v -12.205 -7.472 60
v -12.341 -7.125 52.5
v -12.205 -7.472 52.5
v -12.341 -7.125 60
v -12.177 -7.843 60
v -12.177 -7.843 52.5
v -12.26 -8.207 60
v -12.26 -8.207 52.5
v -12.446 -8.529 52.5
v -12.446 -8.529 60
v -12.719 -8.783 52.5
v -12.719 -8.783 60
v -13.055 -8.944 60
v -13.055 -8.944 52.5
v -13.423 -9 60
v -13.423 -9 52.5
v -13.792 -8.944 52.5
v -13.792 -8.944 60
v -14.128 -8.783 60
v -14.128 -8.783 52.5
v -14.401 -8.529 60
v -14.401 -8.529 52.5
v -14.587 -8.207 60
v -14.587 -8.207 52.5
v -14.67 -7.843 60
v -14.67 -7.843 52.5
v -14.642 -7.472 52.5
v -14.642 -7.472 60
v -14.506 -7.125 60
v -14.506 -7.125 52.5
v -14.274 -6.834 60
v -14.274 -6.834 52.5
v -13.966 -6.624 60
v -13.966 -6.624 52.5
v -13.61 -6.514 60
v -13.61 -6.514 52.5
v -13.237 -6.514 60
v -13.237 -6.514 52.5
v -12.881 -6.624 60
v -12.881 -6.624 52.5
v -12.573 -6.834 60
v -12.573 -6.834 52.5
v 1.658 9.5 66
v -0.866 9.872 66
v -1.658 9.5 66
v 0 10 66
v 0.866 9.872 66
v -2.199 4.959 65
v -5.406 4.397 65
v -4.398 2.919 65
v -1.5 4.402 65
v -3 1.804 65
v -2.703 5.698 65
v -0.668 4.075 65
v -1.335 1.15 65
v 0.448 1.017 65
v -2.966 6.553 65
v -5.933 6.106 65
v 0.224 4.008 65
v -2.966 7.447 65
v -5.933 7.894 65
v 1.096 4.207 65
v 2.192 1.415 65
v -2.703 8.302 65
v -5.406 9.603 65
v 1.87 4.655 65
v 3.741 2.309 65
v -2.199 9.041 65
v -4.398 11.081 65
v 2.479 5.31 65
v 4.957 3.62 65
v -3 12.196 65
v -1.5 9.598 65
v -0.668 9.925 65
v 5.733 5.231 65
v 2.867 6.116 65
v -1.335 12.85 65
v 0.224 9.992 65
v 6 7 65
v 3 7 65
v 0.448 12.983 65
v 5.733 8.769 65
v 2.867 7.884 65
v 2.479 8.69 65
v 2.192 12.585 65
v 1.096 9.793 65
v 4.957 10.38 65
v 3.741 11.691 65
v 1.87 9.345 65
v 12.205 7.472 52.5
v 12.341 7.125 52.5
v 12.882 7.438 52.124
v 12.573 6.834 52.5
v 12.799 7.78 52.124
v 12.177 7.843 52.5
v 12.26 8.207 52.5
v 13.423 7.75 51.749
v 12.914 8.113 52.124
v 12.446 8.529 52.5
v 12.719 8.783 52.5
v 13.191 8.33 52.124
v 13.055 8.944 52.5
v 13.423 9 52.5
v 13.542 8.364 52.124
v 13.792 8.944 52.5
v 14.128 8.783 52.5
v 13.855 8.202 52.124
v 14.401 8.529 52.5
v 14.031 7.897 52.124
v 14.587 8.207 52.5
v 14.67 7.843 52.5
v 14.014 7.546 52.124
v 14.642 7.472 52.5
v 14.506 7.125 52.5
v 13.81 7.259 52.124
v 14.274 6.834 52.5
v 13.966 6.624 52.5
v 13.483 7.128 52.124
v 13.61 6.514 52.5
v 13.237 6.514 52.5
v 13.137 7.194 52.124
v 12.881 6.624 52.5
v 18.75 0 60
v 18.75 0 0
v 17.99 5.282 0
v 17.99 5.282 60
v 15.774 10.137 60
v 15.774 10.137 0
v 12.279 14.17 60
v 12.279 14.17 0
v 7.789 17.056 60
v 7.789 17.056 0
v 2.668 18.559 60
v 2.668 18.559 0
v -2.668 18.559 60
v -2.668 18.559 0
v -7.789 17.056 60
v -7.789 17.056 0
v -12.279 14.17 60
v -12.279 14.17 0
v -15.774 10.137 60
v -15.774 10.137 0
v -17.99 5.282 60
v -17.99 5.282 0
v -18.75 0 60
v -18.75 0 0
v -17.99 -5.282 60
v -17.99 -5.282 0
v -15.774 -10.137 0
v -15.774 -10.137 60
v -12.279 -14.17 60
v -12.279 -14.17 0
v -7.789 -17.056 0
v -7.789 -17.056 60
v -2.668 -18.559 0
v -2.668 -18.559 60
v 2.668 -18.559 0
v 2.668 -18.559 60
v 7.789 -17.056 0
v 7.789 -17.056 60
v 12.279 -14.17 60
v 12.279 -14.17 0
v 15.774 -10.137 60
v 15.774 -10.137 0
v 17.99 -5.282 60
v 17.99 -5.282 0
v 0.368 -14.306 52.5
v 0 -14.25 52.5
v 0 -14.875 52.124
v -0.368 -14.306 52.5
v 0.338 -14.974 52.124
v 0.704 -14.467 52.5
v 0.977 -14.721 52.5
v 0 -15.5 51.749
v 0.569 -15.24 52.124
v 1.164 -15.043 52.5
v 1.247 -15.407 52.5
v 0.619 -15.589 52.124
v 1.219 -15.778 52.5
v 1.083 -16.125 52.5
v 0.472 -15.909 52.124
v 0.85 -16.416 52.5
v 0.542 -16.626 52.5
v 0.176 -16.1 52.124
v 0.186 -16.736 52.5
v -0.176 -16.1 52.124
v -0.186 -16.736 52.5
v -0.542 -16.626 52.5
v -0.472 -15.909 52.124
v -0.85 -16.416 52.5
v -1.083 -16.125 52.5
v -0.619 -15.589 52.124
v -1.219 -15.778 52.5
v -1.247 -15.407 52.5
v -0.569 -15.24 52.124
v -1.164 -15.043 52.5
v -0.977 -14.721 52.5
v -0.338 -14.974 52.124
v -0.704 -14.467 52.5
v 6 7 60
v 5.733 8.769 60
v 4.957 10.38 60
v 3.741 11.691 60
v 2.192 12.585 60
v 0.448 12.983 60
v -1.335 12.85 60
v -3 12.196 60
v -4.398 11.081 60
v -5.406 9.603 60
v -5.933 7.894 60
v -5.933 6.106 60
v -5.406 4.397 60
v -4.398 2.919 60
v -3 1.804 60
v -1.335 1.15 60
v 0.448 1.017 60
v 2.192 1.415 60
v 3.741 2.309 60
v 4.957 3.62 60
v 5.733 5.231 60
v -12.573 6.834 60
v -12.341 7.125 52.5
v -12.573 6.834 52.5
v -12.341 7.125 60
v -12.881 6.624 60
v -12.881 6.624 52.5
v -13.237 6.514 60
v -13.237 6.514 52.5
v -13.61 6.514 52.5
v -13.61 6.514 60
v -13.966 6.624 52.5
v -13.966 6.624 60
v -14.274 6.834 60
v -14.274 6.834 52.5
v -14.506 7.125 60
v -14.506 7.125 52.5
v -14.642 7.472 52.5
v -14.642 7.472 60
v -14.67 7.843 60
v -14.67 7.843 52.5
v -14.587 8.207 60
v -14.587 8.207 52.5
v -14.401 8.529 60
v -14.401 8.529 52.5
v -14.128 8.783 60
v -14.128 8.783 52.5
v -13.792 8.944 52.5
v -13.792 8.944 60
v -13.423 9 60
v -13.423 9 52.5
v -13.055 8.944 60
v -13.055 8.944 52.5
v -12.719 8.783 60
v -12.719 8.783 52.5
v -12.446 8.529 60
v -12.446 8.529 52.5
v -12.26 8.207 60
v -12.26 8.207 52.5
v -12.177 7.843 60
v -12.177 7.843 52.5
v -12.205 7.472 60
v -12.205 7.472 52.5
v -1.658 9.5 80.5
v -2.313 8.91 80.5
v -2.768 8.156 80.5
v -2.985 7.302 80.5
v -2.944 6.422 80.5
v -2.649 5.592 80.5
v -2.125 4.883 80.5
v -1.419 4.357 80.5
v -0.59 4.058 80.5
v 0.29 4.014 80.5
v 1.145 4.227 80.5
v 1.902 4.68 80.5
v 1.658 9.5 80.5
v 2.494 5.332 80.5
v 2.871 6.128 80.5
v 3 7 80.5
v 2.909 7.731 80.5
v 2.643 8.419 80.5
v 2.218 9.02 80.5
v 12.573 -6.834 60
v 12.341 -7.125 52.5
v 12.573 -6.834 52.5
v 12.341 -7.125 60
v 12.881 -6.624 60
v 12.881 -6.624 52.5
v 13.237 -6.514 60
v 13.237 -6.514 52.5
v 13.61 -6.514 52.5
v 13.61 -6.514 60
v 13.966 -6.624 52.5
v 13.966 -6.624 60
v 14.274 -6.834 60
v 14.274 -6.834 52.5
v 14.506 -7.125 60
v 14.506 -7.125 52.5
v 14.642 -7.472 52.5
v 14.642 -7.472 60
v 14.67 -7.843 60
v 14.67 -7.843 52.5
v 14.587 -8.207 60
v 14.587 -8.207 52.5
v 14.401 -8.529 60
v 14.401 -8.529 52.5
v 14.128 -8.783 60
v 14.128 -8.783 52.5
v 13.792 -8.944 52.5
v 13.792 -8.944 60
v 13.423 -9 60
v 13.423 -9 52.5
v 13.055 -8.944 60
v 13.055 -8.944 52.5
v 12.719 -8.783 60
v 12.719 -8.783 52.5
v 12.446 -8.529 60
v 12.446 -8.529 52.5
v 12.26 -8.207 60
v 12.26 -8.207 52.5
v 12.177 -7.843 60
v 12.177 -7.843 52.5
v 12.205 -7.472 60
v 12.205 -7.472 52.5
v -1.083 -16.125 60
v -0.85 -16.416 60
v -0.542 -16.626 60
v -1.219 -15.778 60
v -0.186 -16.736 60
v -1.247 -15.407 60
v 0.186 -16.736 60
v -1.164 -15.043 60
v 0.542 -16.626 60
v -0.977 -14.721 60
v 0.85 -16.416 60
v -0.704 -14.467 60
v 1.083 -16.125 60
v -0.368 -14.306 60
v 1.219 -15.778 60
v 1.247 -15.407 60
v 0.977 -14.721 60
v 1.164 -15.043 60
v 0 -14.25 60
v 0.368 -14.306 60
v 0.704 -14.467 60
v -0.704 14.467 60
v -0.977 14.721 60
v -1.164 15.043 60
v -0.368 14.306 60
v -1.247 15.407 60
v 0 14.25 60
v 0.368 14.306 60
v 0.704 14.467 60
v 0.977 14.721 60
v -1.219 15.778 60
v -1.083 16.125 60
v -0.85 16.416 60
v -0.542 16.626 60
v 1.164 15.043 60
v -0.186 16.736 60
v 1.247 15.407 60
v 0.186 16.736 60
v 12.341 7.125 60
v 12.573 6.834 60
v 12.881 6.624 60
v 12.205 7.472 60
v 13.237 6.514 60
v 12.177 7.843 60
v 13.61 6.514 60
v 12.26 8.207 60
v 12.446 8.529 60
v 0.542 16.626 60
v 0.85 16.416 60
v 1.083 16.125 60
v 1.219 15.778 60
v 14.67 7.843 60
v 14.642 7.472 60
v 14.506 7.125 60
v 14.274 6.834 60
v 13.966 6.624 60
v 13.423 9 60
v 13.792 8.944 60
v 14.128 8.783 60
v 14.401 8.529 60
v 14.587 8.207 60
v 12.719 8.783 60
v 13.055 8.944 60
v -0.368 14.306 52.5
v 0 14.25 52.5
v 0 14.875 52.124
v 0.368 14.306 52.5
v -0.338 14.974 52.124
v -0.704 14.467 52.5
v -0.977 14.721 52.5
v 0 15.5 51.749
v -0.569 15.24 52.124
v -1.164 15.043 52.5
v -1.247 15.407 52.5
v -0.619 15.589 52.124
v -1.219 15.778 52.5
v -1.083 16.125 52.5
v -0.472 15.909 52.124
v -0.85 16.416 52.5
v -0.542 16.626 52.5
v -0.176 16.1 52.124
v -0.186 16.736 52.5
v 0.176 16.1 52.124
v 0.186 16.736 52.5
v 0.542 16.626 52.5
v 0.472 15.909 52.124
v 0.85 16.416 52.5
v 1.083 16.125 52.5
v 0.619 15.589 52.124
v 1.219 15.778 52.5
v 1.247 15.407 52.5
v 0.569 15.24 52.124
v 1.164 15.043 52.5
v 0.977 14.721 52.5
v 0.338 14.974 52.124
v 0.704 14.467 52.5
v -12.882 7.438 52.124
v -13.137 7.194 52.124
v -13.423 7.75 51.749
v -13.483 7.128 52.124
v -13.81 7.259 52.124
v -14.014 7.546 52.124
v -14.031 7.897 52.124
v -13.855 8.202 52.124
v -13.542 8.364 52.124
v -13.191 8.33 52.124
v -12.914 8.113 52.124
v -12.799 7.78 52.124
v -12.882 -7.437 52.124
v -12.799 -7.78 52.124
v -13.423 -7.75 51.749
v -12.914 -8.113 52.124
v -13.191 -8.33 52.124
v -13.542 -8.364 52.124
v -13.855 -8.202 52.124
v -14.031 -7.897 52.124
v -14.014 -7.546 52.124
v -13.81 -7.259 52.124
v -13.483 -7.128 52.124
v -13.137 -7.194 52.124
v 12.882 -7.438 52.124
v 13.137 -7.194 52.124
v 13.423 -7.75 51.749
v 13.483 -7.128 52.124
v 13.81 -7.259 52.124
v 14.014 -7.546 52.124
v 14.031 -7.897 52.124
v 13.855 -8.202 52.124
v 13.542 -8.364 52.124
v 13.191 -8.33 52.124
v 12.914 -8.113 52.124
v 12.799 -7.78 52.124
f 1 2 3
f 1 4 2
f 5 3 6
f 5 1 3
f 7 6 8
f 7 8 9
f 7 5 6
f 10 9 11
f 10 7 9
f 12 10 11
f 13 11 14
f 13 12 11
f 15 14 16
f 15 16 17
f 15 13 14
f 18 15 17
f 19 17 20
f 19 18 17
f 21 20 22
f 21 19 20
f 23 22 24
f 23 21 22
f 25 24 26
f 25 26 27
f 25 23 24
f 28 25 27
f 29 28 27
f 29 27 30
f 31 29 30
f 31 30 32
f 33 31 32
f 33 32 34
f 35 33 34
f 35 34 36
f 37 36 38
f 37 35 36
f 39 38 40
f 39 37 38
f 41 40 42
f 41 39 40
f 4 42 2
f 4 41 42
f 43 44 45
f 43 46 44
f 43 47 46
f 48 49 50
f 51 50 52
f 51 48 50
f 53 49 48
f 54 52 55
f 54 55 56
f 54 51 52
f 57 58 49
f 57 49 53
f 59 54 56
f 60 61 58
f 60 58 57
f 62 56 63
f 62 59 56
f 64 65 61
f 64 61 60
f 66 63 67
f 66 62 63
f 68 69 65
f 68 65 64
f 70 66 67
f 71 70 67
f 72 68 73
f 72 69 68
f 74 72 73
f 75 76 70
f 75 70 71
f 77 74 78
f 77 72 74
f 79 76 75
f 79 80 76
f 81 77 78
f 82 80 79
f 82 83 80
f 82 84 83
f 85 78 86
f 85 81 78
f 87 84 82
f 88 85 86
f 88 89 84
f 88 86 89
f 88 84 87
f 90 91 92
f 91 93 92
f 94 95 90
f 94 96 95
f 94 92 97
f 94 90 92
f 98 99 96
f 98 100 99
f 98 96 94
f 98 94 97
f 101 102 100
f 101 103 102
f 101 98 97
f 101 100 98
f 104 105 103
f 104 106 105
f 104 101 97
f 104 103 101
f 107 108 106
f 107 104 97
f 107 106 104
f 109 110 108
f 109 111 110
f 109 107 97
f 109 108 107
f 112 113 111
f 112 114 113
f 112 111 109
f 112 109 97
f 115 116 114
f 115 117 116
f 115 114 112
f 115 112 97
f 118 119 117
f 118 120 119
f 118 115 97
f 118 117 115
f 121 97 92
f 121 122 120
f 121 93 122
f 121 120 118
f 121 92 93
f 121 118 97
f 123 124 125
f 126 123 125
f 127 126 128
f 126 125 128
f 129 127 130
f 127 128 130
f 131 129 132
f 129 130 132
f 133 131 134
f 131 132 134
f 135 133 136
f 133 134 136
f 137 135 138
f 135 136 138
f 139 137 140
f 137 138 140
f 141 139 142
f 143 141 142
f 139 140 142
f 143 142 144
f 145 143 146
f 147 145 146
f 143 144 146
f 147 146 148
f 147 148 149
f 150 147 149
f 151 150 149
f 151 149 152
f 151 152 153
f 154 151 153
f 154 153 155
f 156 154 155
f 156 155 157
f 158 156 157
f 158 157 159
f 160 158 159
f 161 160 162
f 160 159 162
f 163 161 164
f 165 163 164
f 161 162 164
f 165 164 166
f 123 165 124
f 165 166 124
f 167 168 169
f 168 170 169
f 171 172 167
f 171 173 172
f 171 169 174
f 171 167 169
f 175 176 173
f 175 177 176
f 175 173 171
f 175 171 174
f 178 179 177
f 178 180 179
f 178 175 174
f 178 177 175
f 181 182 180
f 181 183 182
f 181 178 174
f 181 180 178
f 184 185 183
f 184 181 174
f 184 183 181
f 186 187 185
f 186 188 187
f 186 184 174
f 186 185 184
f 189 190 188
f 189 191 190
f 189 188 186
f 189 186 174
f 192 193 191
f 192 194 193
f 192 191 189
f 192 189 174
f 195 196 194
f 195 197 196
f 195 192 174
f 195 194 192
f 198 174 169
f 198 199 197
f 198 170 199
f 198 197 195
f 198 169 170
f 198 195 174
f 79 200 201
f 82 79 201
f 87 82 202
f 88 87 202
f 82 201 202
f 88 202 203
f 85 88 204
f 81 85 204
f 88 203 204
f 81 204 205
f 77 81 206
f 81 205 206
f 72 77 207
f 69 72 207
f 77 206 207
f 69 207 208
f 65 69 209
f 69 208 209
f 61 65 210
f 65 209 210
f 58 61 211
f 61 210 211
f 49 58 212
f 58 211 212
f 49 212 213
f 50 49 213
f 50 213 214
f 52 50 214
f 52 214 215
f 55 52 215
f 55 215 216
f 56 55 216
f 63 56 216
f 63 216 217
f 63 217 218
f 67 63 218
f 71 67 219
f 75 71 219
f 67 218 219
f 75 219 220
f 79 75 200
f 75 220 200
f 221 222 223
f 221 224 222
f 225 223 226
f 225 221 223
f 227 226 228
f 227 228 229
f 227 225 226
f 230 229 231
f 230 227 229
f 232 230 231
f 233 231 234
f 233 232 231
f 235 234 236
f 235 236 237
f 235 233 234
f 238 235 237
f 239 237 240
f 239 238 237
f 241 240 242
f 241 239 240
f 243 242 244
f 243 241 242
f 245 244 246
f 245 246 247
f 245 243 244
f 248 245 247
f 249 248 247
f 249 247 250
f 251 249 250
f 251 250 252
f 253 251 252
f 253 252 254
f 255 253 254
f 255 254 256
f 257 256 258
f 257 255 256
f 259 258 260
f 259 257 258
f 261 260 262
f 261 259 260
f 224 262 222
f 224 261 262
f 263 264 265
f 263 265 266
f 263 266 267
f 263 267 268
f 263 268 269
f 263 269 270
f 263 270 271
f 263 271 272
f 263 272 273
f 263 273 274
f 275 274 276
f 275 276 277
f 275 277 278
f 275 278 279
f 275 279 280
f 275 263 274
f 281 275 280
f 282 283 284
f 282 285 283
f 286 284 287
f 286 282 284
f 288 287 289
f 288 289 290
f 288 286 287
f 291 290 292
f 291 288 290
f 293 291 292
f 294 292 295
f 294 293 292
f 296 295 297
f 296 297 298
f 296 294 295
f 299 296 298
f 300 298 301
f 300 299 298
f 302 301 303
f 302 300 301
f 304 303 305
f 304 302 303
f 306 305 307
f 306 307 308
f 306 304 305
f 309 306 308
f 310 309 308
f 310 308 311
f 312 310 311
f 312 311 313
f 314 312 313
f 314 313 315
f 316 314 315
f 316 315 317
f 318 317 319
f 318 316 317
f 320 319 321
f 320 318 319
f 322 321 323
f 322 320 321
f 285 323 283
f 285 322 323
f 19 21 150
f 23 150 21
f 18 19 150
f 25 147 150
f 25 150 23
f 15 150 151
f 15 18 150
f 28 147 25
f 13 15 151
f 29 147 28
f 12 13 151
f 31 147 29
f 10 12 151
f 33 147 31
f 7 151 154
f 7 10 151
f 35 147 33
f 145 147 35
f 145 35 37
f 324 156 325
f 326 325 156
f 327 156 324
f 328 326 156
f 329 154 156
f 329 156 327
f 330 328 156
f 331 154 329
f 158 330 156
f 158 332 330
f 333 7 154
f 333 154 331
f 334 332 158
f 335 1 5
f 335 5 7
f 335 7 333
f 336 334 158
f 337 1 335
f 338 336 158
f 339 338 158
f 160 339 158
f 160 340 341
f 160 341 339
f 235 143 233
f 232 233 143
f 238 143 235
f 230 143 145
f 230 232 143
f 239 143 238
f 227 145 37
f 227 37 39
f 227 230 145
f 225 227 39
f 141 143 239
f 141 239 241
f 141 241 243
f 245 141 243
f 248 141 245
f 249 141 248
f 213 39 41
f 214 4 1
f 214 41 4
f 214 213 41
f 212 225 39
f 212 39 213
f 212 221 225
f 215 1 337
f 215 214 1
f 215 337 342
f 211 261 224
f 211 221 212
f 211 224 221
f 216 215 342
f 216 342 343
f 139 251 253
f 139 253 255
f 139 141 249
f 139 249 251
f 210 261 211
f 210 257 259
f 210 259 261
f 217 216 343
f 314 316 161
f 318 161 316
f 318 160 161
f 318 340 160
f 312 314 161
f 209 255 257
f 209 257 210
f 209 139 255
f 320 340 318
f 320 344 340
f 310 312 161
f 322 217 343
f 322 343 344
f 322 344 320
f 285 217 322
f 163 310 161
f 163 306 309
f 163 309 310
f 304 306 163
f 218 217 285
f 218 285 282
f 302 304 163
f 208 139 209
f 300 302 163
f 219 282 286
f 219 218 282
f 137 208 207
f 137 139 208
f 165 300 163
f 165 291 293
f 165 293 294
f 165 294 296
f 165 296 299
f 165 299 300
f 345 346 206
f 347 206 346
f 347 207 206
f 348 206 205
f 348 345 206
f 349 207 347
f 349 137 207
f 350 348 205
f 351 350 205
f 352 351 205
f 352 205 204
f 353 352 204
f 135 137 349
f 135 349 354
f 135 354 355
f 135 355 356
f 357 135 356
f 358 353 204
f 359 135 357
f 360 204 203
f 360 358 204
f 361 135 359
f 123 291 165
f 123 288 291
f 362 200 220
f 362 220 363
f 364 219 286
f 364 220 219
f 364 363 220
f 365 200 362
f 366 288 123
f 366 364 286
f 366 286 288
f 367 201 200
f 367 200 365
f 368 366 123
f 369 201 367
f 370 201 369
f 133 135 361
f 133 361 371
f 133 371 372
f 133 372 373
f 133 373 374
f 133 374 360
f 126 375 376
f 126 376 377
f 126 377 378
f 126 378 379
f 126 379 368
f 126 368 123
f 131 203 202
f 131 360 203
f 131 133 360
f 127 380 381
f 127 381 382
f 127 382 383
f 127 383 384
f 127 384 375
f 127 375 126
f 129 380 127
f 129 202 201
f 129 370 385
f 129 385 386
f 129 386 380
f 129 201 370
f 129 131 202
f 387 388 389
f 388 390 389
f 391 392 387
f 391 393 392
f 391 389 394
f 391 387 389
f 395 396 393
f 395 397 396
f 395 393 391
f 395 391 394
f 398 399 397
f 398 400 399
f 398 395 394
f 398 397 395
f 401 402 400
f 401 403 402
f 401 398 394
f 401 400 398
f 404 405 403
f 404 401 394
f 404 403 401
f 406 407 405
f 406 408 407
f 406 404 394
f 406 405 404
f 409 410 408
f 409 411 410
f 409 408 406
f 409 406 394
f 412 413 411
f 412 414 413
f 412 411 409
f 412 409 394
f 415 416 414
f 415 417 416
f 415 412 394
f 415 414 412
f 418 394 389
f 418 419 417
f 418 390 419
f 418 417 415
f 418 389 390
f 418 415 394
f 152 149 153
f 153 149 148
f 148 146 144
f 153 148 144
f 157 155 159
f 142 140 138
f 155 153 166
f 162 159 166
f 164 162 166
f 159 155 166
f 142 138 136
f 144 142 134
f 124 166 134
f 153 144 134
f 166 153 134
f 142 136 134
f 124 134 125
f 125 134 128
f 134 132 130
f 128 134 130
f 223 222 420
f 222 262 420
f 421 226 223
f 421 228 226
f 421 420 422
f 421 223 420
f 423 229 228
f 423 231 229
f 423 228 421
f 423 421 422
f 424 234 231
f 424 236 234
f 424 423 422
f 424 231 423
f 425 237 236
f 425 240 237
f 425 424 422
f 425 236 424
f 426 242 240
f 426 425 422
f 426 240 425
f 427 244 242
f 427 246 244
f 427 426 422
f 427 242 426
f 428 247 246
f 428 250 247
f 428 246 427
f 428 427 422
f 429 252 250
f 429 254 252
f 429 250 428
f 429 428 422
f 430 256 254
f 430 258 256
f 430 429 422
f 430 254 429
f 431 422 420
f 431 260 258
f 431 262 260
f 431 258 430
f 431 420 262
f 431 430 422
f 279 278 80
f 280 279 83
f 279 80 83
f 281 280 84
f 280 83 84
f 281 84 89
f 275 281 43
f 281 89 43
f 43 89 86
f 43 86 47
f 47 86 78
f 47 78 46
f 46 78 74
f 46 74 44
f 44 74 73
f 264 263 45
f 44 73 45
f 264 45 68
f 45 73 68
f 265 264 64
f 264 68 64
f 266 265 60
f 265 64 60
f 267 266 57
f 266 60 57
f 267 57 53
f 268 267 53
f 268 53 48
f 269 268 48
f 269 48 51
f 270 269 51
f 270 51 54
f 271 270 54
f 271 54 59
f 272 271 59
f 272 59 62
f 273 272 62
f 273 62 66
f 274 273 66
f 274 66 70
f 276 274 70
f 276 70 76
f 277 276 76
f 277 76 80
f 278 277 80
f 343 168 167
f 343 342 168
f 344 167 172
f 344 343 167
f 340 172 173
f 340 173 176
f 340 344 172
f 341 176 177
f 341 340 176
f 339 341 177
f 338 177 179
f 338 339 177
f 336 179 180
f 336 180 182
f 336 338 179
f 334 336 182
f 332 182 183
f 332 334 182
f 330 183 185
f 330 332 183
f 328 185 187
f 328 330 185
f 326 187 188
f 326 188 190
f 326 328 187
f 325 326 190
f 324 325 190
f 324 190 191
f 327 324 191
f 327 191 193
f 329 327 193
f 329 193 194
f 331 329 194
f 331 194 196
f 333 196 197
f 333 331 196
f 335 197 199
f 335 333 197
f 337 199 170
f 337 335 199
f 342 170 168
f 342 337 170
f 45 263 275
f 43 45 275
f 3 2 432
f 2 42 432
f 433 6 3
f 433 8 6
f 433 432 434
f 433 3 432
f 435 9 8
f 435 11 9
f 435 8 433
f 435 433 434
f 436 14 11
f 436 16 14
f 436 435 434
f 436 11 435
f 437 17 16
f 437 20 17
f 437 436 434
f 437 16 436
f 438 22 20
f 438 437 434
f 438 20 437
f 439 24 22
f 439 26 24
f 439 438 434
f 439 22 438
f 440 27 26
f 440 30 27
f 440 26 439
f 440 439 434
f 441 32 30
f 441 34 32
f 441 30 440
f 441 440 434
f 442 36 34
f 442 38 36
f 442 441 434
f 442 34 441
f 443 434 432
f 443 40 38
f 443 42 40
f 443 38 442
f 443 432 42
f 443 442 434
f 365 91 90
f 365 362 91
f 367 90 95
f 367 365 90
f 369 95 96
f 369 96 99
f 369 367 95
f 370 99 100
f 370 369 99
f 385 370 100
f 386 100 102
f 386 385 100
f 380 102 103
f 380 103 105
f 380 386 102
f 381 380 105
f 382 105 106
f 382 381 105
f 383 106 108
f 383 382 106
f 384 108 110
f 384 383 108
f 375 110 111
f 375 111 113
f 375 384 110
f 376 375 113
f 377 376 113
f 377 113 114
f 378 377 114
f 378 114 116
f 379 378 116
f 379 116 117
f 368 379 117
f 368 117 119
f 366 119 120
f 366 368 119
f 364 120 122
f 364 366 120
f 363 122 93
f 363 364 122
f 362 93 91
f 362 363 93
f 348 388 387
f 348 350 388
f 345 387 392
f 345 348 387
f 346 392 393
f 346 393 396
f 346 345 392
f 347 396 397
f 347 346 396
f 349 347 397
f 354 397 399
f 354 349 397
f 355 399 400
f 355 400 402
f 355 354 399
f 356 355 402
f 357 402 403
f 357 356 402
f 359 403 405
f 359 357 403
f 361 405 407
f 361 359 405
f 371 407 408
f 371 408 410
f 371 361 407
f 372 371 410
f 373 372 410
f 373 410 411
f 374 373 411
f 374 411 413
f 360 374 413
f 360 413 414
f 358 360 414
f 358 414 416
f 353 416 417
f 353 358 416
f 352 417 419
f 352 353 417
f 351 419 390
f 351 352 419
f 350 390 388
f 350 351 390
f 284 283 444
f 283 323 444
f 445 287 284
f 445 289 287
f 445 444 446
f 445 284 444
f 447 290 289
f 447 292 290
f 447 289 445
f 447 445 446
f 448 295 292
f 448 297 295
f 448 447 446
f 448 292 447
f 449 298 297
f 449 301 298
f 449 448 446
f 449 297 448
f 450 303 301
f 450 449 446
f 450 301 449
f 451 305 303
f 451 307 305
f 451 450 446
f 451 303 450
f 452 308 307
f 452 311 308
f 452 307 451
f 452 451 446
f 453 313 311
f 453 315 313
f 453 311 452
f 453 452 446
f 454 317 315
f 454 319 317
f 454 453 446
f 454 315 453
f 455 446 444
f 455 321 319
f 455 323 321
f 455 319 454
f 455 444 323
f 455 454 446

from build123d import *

# Parameters (mm, degrees)
SKETCH_1_R               = 18.75
EXTRUDE_1_DEPTH          = 60
SKETCH_2_R               = 6
EXTRUDE_2_DEPTH          = 5
SKETCH_3_R               = 3
EXTRUDE_3_DEPTH          = 15.5
SKETCH_4_W               = 7.331861777
SKETCH_4_H               = 1.908292791
CUT_EXTRUDE_1_DEPTH      = 14.5
PATTERN_CIRCULAR_1_COUNT = 6


with BuildPart() as part:
    # 草图1 → 凸台-拉伸1 (new body)
    with BuildSketch(Plane.XY):
        Circle(SKETCH_1_R)
    extrude(amount=EXTRUDE_1_DEPTH)

    # 草图2 → 凸台-拉伸2 (add)
    with BuildSketch(Plane.XY.offset(60)):
        with Locations((0, 7)):
            Circle(SKETCH_2_R)
    extrude(amount=EXTRUDE_2_DEPTH)

    # 草图3 → 凸台-拉伸3 (add)
    with BuildSketch(Plane.XY.offset(65)):
        with Locations((0, 7)):
            Circle(SKETCH_3_R)
    extrude(amount=EXTRUDE_3_DEPTH)

    # 草图4 → 切除-拉伸1 (cut)
    with BuildSketch(Plane.XY.offset(80.5)):
        with Locations((-0.04202298, 10.454146396)):
            Rectangle(SKETCH_4_W, SKETCH_4_H)
    extrude(amount=-CUT_EXTRUDE_1_DEPTH, mode=Mode.SUBTRACT)

    # 草图6 → M3 螺纹孔1 (revolve, cut)
    with BuildSketch(Plane(origin=(0, 15.5, 60), x_dir=(0, -1, 0), z_dir=(1, 0, 0))):
        Polygon((0, 0), (0, 8.251075774), (1.25, 7.5), (1.25, 0), align=None)
    hole_wizard_m3_1 = revolve(axis=Axis((0, 15.5, 66.35), (0, 0, -1)), mode=Mode.SUBTRACT)

    # 阵列(圆周)1: M3 螺纹孔1 ×6 about axis
    pattern_circular_1_axis = Axis((0, 0, 0), (0, 0, 1))
    for i in range(1, PATTERN_CIRCULAR_1_COUNT):
        add(hole_wizard_m3_1.rotate(pattern_circular_1_axis, i * 360 / PATTERN_CIRCULAR_1_COUNT), mode=Mode.SUBTRACT)


solid = part.part
